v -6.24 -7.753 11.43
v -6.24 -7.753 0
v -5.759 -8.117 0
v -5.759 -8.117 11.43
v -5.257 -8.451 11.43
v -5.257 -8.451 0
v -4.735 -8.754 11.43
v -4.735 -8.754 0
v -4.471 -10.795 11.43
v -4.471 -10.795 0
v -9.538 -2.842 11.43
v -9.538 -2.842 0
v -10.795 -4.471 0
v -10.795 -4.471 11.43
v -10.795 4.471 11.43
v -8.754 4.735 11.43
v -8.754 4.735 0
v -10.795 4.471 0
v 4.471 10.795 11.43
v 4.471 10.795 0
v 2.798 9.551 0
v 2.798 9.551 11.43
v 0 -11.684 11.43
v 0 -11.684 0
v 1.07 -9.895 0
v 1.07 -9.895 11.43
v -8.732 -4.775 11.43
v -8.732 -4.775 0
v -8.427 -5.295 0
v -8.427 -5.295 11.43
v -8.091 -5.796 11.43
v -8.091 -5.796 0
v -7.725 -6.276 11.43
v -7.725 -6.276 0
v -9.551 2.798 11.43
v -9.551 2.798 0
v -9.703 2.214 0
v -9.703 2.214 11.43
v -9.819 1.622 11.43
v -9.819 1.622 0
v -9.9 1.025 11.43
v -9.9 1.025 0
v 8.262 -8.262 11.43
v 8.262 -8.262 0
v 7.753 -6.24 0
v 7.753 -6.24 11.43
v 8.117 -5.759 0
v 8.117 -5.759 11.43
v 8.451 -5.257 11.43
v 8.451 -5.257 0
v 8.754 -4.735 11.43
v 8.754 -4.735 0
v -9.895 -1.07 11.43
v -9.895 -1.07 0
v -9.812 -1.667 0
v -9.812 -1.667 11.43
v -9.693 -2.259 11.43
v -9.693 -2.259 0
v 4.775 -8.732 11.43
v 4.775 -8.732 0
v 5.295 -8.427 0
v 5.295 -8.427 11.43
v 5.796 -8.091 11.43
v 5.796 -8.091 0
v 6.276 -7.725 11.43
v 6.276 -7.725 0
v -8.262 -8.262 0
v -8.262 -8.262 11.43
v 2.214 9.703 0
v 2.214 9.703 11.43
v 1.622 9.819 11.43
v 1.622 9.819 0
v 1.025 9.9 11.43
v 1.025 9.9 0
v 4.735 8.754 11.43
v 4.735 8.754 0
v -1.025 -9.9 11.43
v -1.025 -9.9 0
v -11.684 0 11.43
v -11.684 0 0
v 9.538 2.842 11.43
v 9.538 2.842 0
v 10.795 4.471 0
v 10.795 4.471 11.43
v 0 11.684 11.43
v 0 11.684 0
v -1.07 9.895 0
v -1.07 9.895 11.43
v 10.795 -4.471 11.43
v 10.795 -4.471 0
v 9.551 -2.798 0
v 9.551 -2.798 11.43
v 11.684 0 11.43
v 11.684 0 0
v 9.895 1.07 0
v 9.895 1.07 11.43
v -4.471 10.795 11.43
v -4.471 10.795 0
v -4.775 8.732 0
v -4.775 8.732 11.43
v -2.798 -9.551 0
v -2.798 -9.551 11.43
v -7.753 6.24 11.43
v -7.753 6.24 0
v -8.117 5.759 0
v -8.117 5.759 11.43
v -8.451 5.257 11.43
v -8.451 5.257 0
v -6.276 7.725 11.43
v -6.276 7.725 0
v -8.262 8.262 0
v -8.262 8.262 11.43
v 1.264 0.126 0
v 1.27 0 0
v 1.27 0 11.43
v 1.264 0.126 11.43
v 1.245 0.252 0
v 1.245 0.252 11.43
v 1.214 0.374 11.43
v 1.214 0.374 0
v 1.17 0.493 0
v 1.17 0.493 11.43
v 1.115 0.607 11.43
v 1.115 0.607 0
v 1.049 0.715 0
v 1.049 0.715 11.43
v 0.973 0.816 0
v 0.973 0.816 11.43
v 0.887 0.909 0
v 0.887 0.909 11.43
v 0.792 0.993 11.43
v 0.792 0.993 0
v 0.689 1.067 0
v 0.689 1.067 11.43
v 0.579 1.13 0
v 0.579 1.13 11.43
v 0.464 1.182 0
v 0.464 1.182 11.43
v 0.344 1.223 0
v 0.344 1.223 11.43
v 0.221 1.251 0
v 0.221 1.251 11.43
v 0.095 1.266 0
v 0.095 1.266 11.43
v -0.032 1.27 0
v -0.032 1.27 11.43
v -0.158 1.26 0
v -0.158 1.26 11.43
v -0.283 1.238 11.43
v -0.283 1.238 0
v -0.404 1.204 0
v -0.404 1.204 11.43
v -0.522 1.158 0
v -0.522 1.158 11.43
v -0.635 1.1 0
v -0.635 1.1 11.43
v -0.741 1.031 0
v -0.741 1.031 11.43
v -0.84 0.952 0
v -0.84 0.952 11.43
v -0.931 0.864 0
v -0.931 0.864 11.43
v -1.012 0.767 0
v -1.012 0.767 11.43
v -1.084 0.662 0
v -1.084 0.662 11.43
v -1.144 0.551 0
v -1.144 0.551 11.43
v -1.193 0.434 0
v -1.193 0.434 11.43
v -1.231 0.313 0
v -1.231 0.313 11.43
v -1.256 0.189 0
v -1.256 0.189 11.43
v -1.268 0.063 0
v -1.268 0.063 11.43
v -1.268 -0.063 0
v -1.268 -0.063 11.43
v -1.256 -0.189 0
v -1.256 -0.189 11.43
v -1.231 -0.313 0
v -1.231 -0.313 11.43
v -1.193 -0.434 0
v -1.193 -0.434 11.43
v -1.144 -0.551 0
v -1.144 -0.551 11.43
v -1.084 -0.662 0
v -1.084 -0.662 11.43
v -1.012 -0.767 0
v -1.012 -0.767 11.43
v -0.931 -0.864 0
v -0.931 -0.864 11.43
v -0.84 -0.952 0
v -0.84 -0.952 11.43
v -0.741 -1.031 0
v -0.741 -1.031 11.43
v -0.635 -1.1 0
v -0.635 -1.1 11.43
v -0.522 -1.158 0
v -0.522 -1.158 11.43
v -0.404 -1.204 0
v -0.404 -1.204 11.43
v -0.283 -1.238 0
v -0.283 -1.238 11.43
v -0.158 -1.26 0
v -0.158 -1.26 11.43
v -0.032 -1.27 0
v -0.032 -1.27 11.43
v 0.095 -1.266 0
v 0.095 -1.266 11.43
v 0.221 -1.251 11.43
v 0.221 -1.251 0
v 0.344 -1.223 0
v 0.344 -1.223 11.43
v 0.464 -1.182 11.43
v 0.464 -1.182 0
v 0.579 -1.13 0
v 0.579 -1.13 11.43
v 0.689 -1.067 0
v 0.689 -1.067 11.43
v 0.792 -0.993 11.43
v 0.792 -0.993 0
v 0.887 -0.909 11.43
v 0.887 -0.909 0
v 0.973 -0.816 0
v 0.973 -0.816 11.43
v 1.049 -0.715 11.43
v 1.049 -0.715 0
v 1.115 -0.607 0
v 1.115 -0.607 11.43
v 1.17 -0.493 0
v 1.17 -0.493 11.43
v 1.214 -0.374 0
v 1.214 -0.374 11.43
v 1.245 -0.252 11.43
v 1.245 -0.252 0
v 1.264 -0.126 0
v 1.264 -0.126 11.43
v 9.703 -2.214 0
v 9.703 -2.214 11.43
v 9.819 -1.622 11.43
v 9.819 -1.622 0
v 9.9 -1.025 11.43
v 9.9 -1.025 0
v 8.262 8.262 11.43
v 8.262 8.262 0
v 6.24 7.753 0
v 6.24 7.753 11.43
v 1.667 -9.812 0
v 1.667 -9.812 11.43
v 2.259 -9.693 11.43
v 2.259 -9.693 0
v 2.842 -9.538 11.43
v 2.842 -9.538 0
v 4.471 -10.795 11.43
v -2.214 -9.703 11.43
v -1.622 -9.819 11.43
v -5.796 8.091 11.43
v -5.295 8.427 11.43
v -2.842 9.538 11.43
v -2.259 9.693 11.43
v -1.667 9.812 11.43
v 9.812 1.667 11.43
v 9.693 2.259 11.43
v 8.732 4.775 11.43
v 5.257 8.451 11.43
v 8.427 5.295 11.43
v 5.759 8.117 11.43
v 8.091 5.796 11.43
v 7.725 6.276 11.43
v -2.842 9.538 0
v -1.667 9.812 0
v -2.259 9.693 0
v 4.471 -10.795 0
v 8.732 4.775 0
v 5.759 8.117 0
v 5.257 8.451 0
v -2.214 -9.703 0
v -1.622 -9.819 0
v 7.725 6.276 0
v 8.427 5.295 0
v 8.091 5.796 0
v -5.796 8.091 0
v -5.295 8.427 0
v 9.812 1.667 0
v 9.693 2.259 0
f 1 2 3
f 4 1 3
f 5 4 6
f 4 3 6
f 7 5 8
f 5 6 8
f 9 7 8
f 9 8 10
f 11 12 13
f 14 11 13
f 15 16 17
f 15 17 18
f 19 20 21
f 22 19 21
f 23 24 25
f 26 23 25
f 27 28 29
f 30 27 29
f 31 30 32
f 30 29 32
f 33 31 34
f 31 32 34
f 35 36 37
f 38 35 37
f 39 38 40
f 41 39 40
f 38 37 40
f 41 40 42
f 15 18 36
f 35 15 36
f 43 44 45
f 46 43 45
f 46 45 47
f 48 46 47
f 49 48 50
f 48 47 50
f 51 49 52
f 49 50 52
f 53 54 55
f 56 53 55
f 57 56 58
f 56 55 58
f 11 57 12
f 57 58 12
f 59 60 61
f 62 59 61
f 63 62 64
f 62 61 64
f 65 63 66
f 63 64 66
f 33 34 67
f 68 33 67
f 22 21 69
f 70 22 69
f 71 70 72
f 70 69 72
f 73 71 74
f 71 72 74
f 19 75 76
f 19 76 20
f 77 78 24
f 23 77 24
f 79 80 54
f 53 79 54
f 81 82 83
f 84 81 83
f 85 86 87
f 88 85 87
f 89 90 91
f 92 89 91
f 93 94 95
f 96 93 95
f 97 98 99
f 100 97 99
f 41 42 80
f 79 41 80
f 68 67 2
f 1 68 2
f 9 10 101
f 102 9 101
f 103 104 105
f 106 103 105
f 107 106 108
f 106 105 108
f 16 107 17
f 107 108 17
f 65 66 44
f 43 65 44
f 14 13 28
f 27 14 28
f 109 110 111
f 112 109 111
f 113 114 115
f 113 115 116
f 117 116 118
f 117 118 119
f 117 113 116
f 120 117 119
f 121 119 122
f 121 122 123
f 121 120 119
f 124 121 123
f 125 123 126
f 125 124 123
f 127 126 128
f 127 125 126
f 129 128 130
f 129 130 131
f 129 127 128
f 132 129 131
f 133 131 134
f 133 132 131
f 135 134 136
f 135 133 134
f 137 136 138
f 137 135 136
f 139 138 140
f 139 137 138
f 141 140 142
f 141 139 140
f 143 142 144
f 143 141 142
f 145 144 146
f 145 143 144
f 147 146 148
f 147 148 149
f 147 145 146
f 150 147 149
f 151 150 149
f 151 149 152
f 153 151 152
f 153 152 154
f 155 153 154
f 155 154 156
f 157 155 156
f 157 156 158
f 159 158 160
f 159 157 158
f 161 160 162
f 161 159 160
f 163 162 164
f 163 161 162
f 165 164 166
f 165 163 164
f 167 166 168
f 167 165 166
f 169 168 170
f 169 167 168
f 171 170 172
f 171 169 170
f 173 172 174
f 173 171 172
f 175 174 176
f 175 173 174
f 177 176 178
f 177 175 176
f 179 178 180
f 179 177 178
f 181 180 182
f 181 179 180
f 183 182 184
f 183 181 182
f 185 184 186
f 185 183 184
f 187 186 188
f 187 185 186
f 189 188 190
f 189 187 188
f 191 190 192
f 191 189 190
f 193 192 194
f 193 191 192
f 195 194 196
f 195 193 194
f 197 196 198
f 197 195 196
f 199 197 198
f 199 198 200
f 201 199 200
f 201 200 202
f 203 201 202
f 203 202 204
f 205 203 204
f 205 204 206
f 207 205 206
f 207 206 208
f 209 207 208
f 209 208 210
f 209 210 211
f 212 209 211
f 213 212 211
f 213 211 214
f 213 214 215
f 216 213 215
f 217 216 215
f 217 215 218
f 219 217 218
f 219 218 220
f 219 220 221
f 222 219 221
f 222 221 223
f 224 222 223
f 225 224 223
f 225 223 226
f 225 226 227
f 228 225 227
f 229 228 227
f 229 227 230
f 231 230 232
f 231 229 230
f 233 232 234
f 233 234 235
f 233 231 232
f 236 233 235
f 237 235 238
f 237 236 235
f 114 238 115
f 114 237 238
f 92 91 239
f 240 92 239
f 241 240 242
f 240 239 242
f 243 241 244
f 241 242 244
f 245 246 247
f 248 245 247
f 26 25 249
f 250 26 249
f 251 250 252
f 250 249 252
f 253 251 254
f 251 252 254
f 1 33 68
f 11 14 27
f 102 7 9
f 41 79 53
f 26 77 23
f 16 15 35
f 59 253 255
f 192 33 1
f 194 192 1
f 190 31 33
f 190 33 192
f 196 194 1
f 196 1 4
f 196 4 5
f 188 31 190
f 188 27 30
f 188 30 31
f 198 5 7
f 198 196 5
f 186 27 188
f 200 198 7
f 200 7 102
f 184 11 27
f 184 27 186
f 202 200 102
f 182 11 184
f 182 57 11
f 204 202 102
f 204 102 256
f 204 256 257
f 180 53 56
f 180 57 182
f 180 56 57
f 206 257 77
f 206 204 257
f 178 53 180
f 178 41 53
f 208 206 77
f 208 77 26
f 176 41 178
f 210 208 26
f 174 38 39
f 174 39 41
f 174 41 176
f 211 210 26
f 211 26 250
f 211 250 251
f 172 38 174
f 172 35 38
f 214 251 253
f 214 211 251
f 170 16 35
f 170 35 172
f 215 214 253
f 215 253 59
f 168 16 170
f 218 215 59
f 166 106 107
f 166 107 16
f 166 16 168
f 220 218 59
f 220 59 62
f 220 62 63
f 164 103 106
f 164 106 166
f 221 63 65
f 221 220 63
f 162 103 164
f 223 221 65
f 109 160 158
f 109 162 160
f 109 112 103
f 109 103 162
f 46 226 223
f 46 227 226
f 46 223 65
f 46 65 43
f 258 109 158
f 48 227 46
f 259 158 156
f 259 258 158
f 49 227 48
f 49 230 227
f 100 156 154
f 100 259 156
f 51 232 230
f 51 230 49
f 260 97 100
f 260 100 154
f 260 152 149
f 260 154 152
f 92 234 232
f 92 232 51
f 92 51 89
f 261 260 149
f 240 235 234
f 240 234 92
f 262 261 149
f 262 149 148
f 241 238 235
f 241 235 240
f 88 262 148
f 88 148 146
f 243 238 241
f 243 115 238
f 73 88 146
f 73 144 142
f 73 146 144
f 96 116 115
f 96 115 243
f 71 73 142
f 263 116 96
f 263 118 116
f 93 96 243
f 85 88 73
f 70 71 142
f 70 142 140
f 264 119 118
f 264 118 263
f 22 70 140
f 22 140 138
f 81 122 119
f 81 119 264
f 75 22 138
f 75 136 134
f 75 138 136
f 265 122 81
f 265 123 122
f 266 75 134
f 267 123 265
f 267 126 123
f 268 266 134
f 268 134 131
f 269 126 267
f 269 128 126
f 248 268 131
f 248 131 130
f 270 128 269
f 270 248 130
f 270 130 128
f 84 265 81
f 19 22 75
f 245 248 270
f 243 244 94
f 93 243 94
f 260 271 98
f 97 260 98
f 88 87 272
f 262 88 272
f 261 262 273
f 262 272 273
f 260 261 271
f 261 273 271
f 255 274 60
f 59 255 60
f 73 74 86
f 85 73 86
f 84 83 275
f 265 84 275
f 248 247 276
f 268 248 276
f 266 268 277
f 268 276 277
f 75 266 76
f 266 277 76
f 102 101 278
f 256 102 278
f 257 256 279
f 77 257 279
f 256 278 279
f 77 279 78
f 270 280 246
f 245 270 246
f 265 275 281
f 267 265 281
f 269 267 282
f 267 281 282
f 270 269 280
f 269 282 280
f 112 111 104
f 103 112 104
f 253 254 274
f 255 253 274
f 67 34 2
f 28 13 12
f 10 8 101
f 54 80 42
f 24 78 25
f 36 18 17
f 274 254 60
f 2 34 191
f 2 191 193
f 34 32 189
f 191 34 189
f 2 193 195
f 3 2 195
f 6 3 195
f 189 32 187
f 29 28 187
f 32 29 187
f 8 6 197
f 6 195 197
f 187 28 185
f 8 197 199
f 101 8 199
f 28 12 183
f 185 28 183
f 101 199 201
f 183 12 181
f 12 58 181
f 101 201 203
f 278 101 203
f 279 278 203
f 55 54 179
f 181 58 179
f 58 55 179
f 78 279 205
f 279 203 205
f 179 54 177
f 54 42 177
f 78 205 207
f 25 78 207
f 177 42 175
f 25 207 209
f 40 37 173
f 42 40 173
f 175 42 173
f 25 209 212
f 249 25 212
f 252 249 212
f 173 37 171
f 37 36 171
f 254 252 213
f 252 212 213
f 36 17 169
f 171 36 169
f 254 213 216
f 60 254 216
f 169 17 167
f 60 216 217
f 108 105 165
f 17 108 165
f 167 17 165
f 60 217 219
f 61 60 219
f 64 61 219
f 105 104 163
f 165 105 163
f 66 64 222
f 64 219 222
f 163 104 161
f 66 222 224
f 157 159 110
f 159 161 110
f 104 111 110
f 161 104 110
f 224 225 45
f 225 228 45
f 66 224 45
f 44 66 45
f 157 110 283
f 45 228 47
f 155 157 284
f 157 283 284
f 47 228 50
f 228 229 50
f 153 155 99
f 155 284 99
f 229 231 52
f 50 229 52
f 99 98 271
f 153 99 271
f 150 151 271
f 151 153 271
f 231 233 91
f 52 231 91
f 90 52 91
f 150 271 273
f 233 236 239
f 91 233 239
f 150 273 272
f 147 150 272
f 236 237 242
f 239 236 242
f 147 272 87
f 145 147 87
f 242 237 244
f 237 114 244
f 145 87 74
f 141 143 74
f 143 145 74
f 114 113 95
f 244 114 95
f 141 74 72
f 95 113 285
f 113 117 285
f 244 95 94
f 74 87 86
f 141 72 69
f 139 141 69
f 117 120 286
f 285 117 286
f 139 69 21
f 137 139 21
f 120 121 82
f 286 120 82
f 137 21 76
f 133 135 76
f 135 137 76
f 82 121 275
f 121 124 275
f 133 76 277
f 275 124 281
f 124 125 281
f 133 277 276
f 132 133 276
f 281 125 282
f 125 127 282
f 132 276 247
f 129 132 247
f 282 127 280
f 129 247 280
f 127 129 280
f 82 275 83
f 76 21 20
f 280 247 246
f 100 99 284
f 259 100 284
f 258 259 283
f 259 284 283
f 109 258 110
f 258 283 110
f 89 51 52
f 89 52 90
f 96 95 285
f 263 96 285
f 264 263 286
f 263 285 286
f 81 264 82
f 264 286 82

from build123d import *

# Parameters (mm, degrees)
F0_R     = 1.27
F1_DEPTH = 11.43


with BuildPart() as f1:
    # F0 (on Top) → F1 (new body)
    with BuildSketch(Plane.XY):
        with BuildLine():
            ThreePointArc((9.952559, 0), (9.93813, 0.535724), (9.894886, 1.069894))
            ThreePointArc((9.894886, 1.069894), (9.756852, 1.963995), (9.538198, 2.841867))
            ThreePointArc((9.538198, 2.841867), (9.18622, 3.829725), (8.732252, 4.775062))
            ThreePointArc((8.732252, 4.775062), (8.262568, 5.54828), (7.724611, 6.275654))
            ThreePointArc((7.724611, 6.275654), (7.021389, 7.053619), (6.240211, 7.75327))
            ThreePointArc((6.240211, 7.75327), (5.510382, 8.28789), (4.735021, 8.754028))
            ThreePointArc((4.735021, 8.754028), (3.787614, 9.203663), (2.798155, 9.551113))
            ThreePointArc((2.798155, 9.551113), (1.919291, 9.765744), (1.024567, 9.899682))
            ThreePointArc((1.024567, 9.899682), (-0.02279, 9.952533), (-1.069894, 9.894886))
            ThreePointArc((-1.069894, 9.894886), (-1.963995, 9.756852), (-2.841867, 9.538198))
            ThreePointArc((-2.841867, 9.538198), (-3.829725, 9.18622), (-4.775062, 8.732252))
            ThreePointArc((-4.775062, 8.732252), (-5.54828, 8.262568), (-6.275654, 7.724611))
            ThreePointArc((-6.275654, 7.724611), (-7.053619, 7.021389), (-7.75327, 6.240211))
            ThreePointArc((-7.75327, 6.240211), (-8.28789, 5.510382), (-8.754028, 4.735021))
            ThreePointArc((-8.754028, 4.735021), (-9.203663, 3.787614), (-9.551113, 2.798156))
            ThreePointArc((-9.551113, 2.798156), (-9.765744, 1.919291), (-9.899682, 1.024567))
            ThreePointArc((-9.899682, 1.024567), (-9.952533, -0.02279), (-9.894886, -1.069894))
            ThreePointArc((-9.894886, -1.069894), (-9.756852, -1.963995), (-9.538198, -2.841867))
            ThreePointArc((-9.538198, -2.841867), (-9.18622, -3.829725), (-8.732252, -4.775062))
            ThreePointArc((-8.732252, -4.775062), (-8.262568, -5.54828), (-7.724611, -6.275654))
            ThreePointArc((-7.724611, -6.275654), (-7.021389, -7.053619), (-6.240211, -7.75327))
            ThreePointArc((-6.240211, -7.75327), (-5.510382, -8.28789), (-4.735021, -8.754028))
            ThreePointArc((-4.735021, -8.754028), (-3.787614, -9.203663), (-2.798156, -9.551113))
            ThreePointArc((-2.798156, -9.551113), (-1.919291, -9.765744), (-1.024567, -9.899682))
            ThreePointArc((-1.024567, -9.899682), (0.02279, -9.952533), (1.069894, -9.894886))
            ThreePointArc((1.069894, -9.894886), (1.963995, -9.756852), (2.841867, -9.538198))
            ThreePointArc((2.841867, -9.538198), (3.829725, -9.18622), (4.775062, -8.732252))
            ThreePointArc((4.775062, -8.732252), (5.54828, -8.262568), (6.275654, -7.724611))
            ThreePointArc((6.275654, -7.724611), (7.053619, -7.021389), (7.75327, -6.240211))
            ThreePointArc((7.75327, -6.240211), (8.28789, -5.510382), (8.754028, -4.735021))
            ThreePointArc((8.754028, -4.735021), (9.203663, -3.787614), (9.551113, -2.798155))
            ThreePointArc((9.551113, -2.798155), (9.765744, -1.919291), (9.899682, -1.024567))
            ThreePointArc((9.899682, -1.024567), (9.939331, -0.512965), (9.952559, 0))
        make_face()
        Circle(F0_R, mode=Mode.SUBTRACT)
        with BuildLine():
            Line((-2.841867, 9.538198), (-4.471273, 10.794608))
            Line((-4.471273, 10.794608), (-4.775062, 8.732252))
            ThreePointArc((-4.775062, 8.732252), (-3.829725, 9.18622), (-2.841867, 9.538198))
        make_face()
        with BuildLine():
            Line((1.024567, 9.899682), (0, 11.684))
            Line((0, 11.684), (-1.069894, 9.894886))
            ThreePointArc((-1.069894, 9.894886), (-0.02279, 9.952533), (1.024567, 9.899682))
        make_face()
        with BuildLine():
            Line((4.735021, 8.754028), (4.471273, 10.794608))
            Line((4.471273, 10.794608), (2.798155, 9.551113))
            ThreePointArc((2.798155, 9.551113), (3.787614, 9.203663), (4.735021, 8.754028))
        make_face()
        with BuildLine():
            Line((7.724611, 6.275654), (8.261836, 8.261836))
            Line((8.261836, 8.261836), (6.240211, 7.75327))
            ThreePointArc((6.240211, 7.75327), (7.021389, 7.053619), (7.724611, 6.275654))
        make_face()
        with BuildLine():
            Line((9.538198, 2.841867), (10.794608, 4.471273))
            Line((10.794608, 4.471273), (8.732252, 4.775062))
            ThreePointArc((8.732252, 4.775062), (9.18622, 3.829725), (9.538198, 2.841867))
        make_face()
        with BuildLine():
            Line((9.899682, -1.024567), (11.684, 0))
            Line((11.684, 0), (9.894886, 1.069894))
            ThreePointArc((9.894886, 1.069894), (9.93813, 0.535724), (9.952559, 0))
            ThreePointArc((9.952559, 0), (9.939331, -0.512965), (9.899682, -1.024567))
        make_face()
        with BuildLine():
            Line((8.754028, -4.735021), (10.794608, -4.471273))
            Line((10.794608, -4.471273), (9.551113, -2.798155))
            ThreePointArc((9.551113, -2.798155), (9.203663, -3.787614), (8.754028, -4.735021))
        make_face()
        with BuildLine():
            Line((6.275654, -7.724611), (8.261836, -8.261836))
            Line((8.261836, -8.261836), (7.75327, -6.240211))
            ThreePointArc((7.75327, -6.240211), (7.053619, -7.021389), (6.275654, -7.724611))
        make_face()
        with BuildLine():
            Line((2.841867, -9.538198), (4.471273, -10.794608))
            Line((4.471273, -10.794608), (4.775062, -8.732252))
            ThreePointArc((4.775062, -8.732252), (3.829725, -9.18622), (2.841867, -9.538198))
        make_face()
        with BuildLine():
            Line((-1.024567, -9.899682), (0, -11.684))
            Line((0, -11.684), (1.069894, -9.894886))
            ThreePointArc((1.069894, -9.894886), (0.02279, -9.952533), (-1.024567, -9.899682))
        make_face()
        with BuildLine():
            Line((-4.735021, -8.754028), (-4.471273, -10.794608))
            Line((-4.471273, -10.794608), (-2.798156, -9.551113))
            ThreePointArc((-2.798156, -9.551113), (-3.787614, -9.203663), (-4.735021, -8.754028))
        make_face()
        with BuildLine():
            Line((-7.724611, -6.275654), (-8.261836, -8.261836))
            Line((-8.261836, -8.261836), (-6.240211, -7.75327))
            ThreePointArc((-6.240211, -7.75327), (-7.021389, -7.053619), (-7.724611, -6.275654))
        make_face()
        with BuildLine():
            Line((-9.538198, -2.841867), (-10.794608, -4.471273))
            Line((-10.794608, -4.471273), (-8.732252, -4.775062))
            ThreePointArc((-8.732252, -4.775062), (-9.18622, -3.829725), (-9.538198, -2.841867))
        make_face()
        with BuildLine():
            Line((-9.899682, 1.024567), (-11.684, 0))
            Line((-11.684, 0), (-9.894886, -1.069894))
            ThreePointArc((-9.894886, -1.069894), (-9.952533, -0.02279), (-9.899682, 1.024567))
        make_face()
        with BuildLine():
            Line((-8.754028, 4.735021), (-10.794608, 4.471273))
            Line((-10.794608, 4.471273), (-9.551113, 2.798156))
            ThreePointArc((-9.551113, 2.798156), (-9.203663, 3.787614), (-8.754028, 4.735021))
        make_face()
        with BuildLine():
            Line((-6.275654, 7.724611), (-8.261836, 8.261836))
            Line((-8.261836, 8.261836), (-7.75327, 6.240211))
            ThreePointArc((-7.75327, 6.240211), (-7.053619, 7.021389), (-6.275654, 7.724611))
        make_face()
    extrude(amount=F1_DEPTH)


solid = f1.part
